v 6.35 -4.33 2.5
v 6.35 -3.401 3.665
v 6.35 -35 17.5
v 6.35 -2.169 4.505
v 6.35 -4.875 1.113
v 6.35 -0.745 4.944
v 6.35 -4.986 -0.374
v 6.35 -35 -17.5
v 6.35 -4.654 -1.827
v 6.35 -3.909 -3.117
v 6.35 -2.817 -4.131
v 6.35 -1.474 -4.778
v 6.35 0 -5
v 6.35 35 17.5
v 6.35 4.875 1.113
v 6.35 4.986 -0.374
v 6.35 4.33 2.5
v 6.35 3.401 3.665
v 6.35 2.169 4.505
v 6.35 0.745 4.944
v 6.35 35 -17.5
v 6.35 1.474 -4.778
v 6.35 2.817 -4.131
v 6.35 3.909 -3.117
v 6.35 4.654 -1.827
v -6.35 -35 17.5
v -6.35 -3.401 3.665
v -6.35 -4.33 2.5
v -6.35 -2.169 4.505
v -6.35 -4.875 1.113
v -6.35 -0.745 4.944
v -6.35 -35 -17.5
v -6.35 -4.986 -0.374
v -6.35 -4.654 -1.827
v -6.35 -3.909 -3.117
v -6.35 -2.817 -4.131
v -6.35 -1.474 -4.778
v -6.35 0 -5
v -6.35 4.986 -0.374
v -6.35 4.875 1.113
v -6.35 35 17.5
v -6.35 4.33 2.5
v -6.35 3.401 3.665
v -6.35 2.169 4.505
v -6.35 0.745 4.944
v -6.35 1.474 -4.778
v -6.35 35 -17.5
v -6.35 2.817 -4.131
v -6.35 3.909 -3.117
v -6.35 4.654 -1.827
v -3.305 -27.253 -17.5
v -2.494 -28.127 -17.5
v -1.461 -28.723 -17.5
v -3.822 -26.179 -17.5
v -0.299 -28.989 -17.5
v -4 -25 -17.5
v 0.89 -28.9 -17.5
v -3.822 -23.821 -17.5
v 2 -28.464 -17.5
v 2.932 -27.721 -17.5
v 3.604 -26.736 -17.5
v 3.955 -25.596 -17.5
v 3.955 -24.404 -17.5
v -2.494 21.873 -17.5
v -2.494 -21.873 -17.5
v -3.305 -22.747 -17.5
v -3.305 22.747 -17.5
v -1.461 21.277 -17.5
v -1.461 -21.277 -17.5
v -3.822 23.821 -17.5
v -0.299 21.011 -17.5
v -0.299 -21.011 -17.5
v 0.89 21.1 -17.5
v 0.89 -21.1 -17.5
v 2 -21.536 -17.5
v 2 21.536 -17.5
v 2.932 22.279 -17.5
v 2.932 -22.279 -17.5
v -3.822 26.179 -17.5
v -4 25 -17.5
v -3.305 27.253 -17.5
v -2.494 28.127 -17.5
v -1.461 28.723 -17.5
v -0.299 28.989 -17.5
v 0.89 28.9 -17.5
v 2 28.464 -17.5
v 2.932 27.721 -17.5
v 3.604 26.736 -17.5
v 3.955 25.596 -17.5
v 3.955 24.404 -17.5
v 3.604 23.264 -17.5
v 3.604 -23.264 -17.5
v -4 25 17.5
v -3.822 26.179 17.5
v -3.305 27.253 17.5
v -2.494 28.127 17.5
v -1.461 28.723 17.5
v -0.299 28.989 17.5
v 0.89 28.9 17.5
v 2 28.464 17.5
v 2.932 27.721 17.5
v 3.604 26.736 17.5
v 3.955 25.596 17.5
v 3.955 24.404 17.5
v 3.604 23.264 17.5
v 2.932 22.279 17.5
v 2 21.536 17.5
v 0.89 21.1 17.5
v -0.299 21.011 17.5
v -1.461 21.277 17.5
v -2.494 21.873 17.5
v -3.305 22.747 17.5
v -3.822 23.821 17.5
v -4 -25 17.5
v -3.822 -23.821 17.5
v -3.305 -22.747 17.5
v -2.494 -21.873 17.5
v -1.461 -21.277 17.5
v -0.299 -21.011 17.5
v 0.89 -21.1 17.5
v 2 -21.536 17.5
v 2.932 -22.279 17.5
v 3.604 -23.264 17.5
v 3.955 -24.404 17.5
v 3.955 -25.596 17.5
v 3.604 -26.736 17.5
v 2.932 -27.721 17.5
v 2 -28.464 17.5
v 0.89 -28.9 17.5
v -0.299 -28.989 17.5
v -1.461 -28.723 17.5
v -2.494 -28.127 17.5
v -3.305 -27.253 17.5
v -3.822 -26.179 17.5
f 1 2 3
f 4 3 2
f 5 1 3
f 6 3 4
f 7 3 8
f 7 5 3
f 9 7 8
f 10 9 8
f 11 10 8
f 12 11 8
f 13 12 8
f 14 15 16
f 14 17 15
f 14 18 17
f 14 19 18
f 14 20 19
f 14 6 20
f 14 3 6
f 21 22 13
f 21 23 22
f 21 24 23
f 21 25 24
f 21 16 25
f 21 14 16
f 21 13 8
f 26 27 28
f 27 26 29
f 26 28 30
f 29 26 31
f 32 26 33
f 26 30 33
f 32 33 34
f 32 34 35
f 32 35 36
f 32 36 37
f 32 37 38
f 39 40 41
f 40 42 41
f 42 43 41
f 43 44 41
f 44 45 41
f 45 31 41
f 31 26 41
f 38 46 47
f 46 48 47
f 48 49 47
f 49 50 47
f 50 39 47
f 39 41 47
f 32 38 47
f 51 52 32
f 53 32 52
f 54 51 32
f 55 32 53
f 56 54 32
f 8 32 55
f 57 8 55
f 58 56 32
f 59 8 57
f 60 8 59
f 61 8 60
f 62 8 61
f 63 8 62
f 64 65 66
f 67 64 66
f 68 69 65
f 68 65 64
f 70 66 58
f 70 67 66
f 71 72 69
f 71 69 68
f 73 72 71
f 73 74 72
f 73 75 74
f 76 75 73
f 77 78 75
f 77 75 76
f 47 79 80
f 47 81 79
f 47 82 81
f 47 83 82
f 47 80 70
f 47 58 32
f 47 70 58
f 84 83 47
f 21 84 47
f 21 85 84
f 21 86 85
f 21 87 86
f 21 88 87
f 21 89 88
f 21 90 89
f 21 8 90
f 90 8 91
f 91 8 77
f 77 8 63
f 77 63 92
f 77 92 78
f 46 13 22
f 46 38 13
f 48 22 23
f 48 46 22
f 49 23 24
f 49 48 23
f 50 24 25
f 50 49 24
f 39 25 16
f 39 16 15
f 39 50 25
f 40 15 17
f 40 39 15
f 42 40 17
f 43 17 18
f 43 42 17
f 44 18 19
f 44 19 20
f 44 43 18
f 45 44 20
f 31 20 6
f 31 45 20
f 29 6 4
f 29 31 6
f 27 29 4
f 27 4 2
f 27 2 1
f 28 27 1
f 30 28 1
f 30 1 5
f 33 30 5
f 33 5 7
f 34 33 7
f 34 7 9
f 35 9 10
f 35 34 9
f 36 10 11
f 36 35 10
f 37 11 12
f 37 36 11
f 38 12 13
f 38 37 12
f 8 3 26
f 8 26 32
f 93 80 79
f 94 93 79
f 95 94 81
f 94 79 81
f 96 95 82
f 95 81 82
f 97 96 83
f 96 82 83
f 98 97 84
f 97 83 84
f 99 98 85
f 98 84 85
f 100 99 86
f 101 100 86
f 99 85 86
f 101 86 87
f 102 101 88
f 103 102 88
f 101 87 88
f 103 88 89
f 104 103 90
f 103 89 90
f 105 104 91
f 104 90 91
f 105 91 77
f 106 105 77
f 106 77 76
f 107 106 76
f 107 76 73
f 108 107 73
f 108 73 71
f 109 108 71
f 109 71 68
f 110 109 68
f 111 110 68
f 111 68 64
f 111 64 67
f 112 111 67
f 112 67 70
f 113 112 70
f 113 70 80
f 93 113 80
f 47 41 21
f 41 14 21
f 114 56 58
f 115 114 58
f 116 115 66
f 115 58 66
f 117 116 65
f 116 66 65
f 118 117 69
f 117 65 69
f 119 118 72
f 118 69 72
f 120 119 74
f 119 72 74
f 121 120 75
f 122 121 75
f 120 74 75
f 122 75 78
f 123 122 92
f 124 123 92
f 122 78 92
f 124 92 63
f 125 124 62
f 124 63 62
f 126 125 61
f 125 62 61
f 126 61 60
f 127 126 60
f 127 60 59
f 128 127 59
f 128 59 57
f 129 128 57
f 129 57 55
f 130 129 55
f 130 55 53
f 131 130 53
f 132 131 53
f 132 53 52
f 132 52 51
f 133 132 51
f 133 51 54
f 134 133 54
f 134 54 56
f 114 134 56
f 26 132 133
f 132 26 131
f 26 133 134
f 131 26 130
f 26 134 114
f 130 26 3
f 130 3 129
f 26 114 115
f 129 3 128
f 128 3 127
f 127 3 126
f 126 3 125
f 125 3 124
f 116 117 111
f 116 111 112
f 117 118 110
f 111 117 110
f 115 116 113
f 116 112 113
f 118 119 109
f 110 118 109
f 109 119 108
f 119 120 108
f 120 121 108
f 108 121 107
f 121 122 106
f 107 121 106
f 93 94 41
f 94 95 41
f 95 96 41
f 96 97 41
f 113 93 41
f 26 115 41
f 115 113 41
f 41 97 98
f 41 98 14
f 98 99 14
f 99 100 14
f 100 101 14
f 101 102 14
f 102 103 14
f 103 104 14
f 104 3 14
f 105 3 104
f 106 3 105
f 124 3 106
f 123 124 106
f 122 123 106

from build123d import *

# Parameters (mm, degrees)
CROQUIS1_W                    = 35
CROQUIS1_H                    = 70
CROQUIS1_R                    = 5
SALIENTE_EXTRUIR1_DEPTH       = 6.35
DI_METRO_DE_TALADRO_5_0_5_1_D = 8


with BuildPart() as part:
    # Croquis1 → Saliente-Extruir1 (new, symmetric)
    with BuildSketch(Plane(origin=(0, 0, 0), x_dir=(0, 0, -1), z_dir=(1, 0, 0))):
        Rectangle(CROQUIS1_W, CROQUIS1_H)
        Circle(CROQUIS1_R, mode=Mode.SUBTRACT)
    extrude(amount=SALIENTE_EXTRUIR1_DEPTH, both=True)

    # Diámetro de taladro Ø5.0 (5)1 (through all)
    with Locations(Plane.XY.offset(17.5)):
        with Locations((0, 25), (0, -25)):
            Hole(DI_METRO_DE_TALADRO_5_0_5_1_D / 2)


solid = part.part
